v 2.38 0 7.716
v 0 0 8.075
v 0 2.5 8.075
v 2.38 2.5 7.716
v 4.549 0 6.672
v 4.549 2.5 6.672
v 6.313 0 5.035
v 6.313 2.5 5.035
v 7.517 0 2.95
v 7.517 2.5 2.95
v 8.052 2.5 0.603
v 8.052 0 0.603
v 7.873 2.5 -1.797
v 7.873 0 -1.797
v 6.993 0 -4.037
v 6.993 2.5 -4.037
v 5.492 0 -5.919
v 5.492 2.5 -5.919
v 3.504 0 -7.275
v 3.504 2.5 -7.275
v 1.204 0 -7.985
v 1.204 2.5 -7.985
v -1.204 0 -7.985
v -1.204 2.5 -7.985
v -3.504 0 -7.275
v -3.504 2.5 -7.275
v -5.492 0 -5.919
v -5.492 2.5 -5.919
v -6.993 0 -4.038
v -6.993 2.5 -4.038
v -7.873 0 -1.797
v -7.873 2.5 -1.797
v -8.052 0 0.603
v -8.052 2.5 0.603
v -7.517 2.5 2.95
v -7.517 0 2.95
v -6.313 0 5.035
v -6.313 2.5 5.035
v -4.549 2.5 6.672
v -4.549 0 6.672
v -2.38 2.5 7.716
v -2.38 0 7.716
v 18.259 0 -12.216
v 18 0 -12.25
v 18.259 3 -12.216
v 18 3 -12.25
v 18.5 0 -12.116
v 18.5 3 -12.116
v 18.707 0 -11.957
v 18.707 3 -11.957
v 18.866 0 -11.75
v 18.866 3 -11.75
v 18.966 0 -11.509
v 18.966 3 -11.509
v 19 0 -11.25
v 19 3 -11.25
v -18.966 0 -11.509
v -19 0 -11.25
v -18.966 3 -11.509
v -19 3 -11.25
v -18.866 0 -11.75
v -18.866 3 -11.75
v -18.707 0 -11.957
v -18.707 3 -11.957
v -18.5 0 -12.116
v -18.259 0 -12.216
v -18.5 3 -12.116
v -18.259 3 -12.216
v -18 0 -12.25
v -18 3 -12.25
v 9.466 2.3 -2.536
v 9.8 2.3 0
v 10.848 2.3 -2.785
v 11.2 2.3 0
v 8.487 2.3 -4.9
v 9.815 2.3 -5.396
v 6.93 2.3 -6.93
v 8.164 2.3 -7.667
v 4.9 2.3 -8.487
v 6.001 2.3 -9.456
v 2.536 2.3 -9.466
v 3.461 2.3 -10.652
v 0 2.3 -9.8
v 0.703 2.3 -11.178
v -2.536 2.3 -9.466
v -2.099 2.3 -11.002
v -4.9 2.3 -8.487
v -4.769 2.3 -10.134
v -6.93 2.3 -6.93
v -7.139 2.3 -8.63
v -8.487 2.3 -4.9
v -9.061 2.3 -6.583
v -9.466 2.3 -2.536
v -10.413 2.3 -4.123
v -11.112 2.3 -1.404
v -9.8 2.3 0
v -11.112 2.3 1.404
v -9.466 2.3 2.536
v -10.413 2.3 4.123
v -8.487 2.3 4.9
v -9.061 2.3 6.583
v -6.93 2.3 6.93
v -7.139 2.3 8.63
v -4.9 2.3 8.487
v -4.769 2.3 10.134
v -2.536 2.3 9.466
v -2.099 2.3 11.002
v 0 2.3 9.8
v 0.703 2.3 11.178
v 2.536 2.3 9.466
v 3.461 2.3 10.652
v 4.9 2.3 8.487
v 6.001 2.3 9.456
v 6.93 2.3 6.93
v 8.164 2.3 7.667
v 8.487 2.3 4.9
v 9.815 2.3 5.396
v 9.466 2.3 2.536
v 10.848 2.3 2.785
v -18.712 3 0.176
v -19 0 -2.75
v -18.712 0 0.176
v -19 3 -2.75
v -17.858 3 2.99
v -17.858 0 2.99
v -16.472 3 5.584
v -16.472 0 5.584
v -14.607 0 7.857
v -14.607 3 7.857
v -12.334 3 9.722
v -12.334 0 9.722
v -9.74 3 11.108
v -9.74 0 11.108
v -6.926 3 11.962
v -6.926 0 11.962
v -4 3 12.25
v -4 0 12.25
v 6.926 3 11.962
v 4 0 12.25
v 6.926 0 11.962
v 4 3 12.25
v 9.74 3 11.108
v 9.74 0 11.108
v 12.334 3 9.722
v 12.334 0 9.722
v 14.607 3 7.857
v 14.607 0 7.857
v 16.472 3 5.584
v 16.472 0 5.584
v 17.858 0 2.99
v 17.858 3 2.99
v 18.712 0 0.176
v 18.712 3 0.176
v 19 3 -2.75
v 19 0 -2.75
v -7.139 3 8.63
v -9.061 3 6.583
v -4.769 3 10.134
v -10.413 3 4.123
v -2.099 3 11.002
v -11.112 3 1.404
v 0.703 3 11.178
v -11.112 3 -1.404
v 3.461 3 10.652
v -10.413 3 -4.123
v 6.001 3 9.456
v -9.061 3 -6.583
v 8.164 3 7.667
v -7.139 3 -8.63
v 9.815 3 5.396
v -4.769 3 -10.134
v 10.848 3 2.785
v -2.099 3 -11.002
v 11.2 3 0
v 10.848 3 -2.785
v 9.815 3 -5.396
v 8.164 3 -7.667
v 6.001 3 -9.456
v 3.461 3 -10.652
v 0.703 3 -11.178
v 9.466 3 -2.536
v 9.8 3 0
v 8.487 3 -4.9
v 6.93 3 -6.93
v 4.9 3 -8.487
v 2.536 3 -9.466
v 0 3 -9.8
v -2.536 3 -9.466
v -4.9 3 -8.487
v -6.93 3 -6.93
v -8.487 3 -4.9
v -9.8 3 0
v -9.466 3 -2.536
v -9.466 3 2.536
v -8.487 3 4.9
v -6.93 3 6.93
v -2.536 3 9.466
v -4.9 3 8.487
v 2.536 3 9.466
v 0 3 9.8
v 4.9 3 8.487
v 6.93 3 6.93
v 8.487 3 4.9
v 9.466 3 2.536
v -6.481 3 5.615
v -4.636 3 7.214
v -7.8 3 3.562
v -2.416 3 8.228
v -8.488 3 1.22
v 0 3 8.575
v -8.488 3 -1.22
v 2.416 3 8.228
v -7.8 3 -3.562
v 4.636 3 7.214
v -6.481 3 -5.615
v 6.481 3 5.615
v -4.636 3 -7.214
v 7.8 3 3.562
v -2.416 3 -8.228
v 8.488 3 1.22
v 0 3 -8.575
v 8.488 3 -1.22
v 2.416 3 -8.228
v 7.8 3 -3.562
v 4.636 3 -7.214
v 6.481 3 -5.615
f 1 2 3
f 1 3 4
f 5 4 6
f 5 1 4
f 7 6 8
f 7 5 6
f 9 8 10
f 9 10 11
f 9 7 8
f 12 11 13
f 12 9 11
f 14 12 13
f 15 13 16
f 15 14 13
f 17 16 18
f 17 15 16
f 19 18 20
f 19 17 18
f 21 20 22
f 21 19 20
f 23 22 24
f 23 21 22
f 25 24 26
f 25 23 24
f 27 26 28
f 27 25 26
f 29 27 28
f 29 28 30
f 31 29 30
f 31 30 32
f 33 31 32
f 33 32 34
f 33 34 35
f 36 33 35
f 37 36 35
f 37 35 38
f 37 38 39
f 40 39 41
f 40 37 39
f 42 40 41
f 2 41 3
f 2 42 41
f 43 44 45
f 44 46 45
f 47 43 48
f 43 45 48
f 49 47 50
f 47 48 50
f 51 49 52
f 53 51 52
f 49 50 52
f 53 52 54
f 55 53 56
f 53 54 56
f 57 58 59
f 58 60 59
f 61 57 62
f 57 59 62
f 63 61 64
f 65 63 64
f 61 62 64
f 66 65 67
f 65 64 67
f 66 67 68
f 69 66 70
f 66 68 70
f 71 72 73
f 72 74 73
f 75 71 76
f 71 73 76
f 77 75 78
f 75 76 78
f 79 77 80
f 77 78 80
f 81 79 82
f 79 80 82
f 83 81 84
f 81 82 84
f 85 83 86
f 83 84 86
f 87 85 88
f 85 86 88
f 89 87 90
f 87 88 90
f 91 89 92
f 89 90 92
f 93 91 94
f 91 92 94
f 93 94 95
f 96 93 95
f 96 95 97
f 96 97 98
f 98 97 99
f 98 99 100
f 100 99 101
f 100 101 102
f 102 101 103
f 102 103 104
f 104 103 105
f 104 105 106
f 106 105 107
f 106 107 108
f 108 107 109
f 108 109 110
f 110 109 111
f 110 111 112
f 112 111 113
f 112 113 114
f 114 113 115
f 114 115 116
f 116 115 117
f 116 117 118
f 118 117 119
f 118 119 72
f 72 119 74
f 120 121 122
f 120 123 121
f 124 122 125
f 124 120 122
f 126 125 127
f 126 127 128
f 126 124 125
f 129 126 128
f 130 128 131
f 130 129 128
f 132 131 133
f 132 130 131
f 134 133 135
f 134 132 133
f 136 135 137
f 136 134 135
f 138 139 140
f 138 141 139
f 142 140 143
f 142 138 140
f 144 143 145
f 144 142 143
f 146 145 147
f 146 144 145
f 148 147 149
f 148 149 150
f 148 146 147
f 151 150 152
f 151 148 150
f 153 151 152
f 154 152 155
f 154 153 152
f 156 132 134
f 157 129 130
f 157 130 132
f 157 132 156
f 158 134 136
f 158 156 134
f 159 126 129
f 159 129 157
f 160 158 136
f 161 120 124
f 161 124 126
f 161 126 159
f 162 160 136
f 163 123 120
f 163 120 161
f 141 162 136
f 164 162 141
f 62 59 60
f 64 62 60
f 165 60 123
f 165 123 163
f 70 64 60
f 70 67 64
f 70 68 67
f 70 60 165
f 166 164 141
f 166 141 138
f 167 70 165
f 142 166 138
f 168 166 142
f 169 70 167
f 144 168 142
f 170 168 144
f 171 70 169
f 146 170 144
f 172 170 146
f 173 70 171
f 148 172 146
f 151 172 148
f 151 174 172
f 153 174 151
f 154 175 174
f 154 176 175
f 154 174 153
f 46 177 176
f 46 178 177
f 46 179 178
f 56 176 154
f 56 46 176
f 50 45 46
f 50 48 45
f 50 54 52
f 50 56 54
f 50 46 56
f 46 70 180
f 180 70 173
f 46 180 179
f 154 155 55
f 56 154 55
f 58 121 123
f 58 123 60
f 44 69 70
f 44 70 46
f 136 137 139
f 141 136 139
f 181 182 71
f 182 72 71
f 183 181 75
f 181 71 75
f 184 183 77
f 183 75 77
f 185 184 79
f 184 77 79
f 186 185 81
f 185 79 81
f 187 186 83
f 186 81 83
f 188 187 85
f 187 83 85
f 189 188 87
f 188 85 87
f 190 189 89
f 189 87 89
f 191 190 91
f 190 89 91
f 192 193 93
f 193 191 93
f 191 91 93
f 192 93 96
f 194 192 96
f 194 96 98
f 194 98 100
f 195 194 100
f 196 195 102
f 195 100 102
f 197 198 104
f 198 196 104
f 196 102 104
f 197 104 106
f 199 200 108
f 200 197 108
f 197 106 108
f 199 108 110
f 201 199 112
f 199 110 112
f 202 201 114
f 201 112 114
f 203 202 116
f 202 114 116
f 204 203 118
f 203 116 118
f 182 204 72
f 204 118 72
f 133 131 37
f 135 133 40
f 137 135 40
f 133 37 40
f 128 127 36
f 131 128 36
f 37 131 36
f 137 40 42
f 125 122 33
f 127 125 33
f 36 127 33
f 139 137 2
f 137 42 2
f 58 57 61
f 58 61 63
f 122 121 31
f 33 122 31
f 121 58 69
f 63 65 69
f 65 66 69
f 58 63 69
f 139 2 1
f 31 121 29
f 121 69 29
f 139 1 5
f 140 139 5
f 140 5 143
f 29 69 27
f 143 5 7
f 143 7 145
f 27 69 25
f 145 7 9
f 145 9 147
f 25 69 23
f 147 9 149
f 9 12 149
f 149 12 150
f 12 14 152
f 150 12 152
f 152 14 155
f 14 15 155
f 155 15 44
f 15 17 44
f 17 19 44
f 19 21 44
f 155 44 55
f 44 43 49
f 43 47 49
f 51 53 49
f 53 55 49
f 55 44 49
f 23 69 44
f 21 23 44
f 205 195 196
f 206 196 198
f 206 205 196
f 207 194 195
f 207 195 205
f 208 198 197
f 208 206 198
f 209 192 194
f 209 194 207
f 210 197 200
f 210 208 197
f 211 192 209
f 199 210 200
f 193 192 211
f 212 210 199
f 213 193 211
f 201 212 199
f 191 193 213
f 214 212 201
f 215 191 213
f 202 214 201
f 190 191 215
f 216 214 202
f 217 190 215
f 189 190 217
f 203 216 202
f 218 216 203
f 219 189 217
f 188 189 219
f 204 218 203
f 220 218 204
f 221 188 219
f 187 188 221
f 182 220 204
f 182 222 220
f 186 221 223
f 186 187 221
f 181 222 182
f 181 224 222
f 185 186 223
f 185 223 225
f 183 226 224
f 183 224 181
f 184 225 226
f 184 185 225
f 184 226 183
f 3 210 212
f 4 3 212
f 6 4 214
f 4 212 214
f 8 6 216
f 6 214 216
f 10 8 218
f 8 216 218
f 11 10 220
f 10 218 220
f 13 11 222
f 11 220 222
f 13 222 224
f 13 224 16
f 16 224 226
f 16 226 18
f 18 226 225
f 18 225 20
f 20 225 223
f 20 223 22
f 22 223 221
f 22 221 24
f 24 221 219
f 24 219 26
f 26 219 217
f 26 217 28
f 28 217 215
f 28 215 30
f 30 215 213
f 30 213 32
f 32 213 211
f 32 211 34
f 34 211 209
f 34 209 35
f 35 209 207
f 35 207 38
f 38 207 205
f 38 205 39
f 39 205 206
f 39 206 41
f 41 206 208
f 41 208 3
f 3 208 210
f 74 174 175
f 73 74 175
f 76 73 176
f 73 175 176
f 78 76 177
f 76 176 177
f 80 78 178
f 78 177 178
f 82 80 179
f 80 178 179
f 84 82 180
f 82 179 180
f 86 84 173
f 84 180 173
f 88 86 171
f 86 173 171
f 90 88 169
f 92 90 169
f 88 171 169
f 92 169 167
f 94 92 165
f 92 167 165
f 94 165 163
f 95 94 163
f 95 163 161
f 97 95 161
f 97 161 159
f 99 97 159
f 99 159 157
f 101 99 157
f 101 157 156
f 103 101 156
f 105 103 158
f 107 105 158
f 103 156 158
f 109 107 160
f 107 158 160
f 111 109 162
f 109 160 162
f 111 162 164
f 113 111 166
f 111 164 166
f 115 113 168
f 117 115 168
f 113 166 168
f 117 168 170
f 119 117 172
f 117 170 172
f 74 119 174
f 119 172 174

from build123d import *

# Parameters (mm, degrees)
SKETCH1_W           = 38
SKETCH1_H           = 24.5
SKETCH1_R           = 8.075
BOSS_EXTRUDE1_DEPTH = 3
FILLET1_R           = 15
SKETCH3_W           = 1.4
SKETCH3_H           = 1.4
FILLET2_R           = 1
CHAMFER1_SIZE       = 0.5


with BuildPart() as part:
    # Sketch1 → Boss-Extrude1 (new body)
    with BuildSketch(Plane(origin=(0, 0, 0), x_dir=(1, 0, 0), z_dir=(0, 1, 0))):
        Rectangle(SKETCH1_W, SKETCH1_H)
        with Locations(Location((0, 0, 0), (0, 0, 270))):
            Circle(SKETCH1_R, mode=Mode.SUBTRACT)
    extrude(amount=BOSS_EXTRUDE1_DEPTH)

    # Fillet1
    fillet1_edges = [part.edges().sort_by_distance(p)[0] for p in [
        (19, 1.5, 12.25),
        (-19, 1.5, 12.25),
    ]]
    fillet(fillet1_edges, radius=FILLET1_R)

    # Cut-Sweep1: sweep along a path in Sketch2
    with BuildLine(Plane(origin=(0, 3, 0), x_dir=(1, 0, 0), z_dir=(0, 1, 0))) as cut_sweep1_path:
        CenterArc((0, 0), 10.5, 0, 360)
    # Sketch3 → Cut-Sweep1 (sweep, cut)
    with BuildSketch(Plane.XY):
        with Locations((10.5, 3)):
            Rectangle(SKETCH3_W, SKETCH3_H)
    sweep(path=cut_sweep1_path.line, mode=Mode.SUBTRACT)

    # Fillet2
    fillet2_edges = [part.edges().sort_by_distance(p)[0] for p in [
        (-19, 1.5, -12.25),
        (19, 1.5, -12.25),
    ]]
    fillet(fillet2_edges, radius=FILLET2_R)

    # Chamfer1
    chamfer1_edges = [part.edges().sort_by_distance(p)[0] for p in [
        (0, 3, -8.075),
    ]]
    chamfer(chamfer1_edges, length=CHAMFER1_SIZE)


solid = part.part
